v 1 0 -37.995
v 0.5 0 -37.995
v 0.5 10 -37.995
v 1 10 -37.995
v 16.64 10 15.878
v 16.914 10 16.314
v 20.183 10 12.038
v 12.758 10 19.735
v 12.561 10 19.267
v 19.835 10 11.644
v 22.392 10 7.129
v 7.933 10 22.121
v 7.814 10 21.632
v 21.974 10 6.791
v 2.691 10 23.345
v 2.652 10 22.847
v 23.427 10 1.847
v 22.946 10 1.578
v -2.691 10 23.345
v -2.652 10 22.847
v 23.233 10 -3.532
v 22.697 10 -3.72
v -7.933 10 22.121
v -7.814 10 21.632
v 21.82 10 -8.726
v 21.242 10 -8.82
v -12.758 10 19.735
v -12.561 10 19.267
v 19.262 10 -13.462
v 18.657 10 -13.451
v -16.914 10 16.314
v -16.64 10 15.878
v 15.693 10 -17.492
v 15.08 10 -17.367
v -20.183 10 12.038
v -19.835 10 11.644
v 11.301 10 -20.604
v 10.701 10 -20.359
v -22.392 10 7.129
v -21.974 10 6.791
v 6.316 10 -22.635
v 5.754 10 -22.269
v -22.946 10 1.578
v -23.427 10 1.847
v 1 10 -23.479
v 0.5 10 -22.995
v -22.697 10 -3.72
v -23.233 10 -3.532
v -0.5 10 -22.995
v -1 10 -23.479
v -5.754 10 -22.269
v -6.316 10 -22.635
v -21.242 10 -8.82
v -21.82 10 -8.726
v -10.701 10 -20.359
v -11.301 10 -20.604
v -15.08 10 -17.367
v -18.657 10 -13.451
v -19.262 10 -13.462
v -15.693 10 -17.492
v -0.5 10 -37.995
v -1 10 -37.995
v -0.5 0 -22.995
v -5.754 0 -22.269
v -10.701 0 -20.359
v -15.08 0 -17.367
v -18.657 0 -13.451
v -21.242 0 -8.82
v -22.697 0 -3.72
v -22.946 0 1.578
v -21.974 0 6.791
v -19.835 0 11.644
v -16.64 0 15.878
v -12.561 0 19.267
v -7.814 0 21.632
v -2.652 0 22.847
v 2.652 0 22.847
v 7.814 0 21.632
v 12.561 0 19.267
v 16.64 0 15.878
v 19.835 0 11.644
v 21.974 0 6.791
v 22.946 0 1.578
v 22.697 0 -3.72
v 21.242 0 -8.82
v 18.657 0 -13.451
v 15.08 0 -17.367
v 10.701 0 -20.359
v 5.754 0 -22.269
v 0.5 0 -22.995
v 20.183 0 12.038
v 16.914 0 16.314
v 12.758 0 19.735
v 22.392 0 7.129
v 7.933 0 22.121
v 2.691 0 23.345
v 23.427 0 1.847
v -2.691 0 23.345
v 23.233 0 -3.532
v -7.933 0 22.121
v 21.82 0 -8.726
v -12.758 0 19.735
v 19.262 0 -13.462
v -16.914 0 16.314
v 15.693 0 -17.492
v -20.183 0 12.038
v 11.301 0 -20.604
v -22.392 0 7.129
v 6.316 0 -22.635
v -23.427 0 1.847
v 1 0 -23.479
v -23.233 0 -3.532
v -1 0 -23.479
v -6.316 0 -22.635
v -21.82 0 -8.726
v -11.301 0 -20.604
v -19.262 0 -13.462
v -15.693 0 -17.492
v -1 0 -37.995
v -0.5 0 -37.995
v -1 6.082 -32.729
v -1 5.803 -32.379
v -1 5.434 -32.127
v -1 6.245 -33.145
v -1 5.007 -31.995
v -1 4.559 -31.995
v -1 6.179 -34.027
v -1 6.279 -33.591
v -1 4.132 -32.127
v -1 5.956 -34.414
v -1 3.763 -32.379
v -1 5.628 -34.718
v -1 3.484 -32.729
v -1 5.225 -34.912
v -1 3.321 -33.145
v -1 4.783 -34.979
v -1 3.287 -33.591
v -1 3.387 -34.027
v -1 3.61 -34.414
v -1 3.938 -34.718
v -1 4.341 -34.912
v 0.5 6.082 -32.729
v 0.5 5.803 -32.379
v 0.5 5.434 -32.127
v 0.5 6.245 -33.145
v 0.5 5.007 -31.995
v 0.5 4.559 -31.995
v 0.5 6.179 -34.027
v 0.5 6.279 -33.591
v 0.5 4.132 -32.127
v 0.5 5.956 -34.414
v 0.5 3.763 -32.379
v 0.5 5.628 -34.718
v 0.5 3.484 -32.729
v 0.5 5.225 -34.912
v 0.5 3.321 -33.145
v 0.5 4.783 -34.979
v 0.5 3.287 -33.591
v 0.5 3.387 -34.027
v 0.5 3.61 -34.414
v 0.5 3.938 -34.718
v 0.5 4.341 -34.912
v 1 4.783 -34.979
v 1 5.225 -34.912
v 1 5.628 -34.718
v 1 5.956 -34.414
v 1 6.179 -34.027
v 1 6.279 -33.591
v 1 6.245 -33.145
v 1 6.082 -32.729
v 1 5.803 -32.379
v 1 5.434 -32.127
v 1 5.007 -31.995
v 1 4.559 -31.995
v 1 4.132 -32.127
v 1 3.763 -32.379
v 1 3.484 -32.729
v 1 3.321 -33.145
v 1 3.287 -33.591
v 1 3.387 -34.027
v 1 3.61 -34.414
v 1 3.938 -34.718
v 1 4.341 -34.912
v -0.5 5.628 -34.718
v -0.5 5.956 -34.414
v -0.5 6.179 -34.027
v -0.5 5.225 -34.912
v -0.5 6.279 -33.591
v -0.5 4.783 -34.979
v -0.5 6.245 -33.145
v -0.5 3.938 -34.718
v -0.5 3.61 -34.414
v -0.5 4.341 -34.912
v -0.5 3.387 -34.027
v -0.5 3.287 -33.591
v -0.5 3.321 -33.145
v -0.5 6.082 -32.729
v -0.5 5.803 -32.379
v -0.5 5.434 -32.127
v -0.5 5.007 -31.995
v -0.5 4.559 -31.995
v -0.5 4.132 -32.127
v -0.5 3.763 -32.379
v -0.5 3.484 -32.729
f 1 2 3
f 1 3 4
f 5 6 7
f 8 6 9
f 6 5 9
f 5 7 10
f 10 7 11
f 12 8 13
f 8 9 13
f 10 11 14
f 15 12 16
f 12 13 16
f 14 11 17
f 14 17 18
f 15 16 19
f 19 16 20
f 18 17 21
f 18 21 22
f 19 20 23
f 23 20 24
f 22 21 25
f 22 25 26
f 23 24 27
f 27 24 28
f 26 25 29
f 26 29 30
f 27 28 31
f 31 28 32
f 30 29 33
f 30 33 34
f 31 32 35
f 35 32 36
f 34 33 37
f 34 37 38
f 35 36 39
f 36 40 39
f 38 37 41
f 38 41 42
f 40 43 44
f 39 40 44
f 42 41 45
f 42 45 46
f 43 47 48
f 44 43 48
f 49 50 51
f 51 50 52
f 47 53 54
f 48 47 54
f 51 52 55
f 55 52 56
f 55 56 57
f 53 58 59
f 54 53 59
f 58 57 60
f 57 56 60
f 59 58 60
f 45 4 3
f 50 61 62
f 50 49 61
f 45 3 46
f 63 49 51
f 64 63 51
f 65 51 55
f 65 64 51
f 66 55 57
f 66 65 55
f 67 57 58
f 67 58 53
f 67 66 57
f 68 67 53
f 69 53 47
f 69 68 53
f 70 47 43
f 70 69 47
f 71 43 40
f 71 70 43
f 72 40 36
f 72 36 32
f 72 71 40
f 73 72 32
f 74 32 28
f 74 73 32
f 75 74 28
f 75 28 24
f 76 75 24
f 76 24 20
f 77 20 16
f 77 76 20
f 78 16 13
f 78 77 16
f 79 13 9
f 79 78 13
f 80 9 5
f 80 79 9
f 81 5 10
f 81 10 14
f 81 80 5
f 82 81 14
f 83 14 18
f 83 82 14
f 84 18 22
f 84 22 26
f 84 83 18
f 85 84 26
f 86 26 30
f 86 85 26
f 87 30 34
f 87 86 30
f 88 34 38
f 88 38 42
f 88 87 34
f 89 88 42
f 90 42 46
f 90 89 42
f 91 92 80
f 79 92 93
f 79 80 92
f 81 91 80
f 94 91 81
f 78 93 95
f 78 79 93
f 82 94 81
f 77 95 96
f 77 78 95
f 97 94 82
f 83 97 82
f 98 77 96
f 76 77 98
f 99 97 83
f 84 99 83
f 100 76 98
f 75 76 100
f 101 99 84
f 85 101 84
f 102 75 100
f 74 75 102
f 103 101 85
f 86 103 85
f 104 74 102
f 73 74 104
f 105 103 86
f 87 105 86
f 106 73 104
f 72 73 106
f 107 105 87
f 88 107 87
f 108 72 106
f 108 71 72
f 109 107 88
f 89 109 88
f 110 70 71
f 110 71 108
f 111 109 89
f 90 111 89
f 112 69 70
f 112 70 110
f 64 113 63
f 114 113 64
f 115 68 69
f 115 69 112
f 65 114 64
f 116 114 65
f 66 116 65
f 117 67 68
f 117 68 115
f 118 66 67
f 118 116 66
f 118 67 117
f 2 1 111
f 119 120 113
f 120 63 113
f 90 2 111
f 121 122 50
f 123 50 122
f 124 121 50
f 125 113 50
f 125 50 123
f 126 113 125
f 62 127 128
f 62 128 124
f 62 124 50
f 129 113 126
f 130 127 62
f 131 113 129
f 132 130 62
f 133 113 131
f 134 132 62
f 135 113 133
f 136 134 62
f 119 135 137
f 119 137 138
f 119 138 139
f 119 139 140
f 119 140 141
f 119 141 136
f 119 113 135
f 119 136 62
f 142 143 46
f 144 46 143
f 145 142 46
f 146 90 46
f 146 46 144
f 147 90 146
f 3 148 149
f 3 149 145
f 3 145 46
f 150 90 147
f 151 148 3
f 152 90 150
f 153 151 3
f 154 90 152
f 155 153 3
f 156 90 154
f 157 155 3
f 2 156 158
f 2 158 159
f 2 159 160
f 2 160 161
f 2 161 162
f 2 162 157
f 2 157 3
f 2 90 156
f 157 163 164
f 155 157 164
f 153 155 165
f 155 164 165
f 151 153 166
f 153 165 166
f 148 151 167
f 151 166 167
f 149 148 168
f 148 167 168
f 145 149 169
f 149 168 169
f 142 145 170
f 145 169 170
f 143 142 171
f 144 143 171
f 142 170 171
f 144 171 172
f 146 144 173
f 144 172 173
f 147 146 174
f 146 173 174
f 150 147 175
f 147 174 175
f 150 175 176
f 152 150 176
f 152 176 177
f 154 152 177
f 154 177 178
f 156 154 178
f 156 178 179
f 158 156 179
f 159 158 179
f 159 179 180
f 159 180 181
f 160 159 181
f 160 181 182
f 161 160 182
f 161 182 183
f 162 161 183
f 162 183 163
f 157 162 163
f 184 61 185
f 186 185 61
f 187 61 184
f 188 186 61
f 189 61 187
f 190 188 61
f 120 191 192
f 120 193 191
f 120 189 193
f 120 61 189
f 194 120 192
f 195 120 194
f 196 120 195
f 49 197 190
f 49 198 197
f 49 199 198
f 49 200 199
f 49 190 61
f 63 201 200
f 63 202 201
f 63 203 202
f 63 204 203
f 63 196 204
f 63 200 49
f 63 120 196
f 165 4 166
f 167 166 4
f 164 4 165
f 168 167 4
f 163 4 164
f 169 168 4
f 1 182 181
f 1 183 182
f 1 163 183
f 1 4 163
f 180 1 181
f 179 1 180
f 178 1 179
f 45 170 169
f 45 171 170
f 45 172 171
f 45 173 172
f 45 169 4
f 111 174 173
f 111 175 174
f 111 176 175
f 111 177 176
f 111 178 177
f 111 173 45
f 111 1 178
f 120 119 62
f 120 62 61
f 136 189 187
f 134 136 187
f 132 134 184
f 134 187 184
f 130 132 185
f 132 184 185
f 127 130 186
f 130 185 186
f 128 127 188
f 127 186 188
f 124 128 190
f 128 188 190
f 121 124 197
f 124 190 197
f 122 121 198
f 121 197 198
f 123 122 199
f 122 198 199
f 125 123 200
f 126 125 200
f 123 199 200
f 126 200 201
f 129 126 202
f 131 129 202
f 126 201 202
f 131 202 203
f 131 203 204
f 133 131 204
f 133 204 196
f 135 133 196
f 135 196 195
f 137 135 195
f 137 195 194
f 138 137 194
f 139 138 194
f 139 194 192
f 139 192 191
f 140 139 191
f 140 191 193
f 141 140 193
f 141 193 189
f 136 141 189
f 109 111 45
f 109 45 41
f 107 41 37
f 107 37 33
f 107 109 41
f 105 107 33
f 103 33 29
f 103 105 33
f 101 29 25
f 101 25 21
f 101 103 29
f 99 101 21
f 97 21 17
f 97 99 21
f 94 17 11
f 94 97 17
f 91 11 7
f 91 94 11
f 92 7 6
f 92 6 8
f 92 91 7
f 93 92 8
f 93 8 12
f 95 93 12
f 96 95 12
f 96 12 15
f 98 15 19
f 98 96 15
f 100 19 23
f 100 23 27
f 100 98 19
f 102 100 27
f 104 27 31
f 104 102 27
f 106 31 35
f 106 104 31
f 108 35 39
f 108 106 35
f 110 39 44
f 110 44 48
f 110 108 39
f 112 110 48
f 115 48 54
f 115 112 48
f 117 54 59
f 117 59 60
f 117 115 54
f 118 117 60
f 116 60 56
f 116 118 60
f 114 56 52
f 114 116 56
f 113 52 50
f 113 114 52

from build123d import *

# Parameters (mm, degrees)
BOSS_EXTRUDE1_DEPTH = 10
SKETCH2_R           = 1.5
CUT_EXTRUDE1_DEPTH  = 25.5


with BuildPart() as part:
    # Sketch1 → Boss-Extrude1 (new body)
    with BuildSketch(Plane(origin=(0, 0, 0), x_dir=(1, 0, 0), z_dir=(0, 1, 0))):
        with BuildLine():
            Line((-0.5, 37.994564575), (-0.5, 22.994564575))
            ThreePointArc((-0.5, 22.994564575), (0, -23), (0.5, 22.994564575))
            Line((0.5, 22.994564575), (0.5, 37.994564575))
            Line((0.5, 37.994564575), (1, 37.994564575))
            Line((1, 37.994564575), (1, 23.478713764))
            ThreePointArc((1, 23.478713764), (0, -23.5), (-1, 23.478713764))
            Line((-1, 23.478713764), (-1, 37.994564575))
            Line((-1, 37.994564575), (-0.5, 37.994564575))
        make_face()
    extrude(amount=BOSS_EXTRUDE1_DEPTH)

    # Sketch2 → Cut-Extrude1 (cut, through all)
    with BuildSketch(Plane(origin=(1, 0, 0), x_dir=(0, 0, -1), z_dir=(1, 0, 0))):
        with Locations((33.478713764, 4.782975317)):
            Circle(SKETCH2_R)
    extrude(amount=-CUT_EXTRUDE1_DEPTH, mode=Mode.SUBTRACT)


solid = part.part
